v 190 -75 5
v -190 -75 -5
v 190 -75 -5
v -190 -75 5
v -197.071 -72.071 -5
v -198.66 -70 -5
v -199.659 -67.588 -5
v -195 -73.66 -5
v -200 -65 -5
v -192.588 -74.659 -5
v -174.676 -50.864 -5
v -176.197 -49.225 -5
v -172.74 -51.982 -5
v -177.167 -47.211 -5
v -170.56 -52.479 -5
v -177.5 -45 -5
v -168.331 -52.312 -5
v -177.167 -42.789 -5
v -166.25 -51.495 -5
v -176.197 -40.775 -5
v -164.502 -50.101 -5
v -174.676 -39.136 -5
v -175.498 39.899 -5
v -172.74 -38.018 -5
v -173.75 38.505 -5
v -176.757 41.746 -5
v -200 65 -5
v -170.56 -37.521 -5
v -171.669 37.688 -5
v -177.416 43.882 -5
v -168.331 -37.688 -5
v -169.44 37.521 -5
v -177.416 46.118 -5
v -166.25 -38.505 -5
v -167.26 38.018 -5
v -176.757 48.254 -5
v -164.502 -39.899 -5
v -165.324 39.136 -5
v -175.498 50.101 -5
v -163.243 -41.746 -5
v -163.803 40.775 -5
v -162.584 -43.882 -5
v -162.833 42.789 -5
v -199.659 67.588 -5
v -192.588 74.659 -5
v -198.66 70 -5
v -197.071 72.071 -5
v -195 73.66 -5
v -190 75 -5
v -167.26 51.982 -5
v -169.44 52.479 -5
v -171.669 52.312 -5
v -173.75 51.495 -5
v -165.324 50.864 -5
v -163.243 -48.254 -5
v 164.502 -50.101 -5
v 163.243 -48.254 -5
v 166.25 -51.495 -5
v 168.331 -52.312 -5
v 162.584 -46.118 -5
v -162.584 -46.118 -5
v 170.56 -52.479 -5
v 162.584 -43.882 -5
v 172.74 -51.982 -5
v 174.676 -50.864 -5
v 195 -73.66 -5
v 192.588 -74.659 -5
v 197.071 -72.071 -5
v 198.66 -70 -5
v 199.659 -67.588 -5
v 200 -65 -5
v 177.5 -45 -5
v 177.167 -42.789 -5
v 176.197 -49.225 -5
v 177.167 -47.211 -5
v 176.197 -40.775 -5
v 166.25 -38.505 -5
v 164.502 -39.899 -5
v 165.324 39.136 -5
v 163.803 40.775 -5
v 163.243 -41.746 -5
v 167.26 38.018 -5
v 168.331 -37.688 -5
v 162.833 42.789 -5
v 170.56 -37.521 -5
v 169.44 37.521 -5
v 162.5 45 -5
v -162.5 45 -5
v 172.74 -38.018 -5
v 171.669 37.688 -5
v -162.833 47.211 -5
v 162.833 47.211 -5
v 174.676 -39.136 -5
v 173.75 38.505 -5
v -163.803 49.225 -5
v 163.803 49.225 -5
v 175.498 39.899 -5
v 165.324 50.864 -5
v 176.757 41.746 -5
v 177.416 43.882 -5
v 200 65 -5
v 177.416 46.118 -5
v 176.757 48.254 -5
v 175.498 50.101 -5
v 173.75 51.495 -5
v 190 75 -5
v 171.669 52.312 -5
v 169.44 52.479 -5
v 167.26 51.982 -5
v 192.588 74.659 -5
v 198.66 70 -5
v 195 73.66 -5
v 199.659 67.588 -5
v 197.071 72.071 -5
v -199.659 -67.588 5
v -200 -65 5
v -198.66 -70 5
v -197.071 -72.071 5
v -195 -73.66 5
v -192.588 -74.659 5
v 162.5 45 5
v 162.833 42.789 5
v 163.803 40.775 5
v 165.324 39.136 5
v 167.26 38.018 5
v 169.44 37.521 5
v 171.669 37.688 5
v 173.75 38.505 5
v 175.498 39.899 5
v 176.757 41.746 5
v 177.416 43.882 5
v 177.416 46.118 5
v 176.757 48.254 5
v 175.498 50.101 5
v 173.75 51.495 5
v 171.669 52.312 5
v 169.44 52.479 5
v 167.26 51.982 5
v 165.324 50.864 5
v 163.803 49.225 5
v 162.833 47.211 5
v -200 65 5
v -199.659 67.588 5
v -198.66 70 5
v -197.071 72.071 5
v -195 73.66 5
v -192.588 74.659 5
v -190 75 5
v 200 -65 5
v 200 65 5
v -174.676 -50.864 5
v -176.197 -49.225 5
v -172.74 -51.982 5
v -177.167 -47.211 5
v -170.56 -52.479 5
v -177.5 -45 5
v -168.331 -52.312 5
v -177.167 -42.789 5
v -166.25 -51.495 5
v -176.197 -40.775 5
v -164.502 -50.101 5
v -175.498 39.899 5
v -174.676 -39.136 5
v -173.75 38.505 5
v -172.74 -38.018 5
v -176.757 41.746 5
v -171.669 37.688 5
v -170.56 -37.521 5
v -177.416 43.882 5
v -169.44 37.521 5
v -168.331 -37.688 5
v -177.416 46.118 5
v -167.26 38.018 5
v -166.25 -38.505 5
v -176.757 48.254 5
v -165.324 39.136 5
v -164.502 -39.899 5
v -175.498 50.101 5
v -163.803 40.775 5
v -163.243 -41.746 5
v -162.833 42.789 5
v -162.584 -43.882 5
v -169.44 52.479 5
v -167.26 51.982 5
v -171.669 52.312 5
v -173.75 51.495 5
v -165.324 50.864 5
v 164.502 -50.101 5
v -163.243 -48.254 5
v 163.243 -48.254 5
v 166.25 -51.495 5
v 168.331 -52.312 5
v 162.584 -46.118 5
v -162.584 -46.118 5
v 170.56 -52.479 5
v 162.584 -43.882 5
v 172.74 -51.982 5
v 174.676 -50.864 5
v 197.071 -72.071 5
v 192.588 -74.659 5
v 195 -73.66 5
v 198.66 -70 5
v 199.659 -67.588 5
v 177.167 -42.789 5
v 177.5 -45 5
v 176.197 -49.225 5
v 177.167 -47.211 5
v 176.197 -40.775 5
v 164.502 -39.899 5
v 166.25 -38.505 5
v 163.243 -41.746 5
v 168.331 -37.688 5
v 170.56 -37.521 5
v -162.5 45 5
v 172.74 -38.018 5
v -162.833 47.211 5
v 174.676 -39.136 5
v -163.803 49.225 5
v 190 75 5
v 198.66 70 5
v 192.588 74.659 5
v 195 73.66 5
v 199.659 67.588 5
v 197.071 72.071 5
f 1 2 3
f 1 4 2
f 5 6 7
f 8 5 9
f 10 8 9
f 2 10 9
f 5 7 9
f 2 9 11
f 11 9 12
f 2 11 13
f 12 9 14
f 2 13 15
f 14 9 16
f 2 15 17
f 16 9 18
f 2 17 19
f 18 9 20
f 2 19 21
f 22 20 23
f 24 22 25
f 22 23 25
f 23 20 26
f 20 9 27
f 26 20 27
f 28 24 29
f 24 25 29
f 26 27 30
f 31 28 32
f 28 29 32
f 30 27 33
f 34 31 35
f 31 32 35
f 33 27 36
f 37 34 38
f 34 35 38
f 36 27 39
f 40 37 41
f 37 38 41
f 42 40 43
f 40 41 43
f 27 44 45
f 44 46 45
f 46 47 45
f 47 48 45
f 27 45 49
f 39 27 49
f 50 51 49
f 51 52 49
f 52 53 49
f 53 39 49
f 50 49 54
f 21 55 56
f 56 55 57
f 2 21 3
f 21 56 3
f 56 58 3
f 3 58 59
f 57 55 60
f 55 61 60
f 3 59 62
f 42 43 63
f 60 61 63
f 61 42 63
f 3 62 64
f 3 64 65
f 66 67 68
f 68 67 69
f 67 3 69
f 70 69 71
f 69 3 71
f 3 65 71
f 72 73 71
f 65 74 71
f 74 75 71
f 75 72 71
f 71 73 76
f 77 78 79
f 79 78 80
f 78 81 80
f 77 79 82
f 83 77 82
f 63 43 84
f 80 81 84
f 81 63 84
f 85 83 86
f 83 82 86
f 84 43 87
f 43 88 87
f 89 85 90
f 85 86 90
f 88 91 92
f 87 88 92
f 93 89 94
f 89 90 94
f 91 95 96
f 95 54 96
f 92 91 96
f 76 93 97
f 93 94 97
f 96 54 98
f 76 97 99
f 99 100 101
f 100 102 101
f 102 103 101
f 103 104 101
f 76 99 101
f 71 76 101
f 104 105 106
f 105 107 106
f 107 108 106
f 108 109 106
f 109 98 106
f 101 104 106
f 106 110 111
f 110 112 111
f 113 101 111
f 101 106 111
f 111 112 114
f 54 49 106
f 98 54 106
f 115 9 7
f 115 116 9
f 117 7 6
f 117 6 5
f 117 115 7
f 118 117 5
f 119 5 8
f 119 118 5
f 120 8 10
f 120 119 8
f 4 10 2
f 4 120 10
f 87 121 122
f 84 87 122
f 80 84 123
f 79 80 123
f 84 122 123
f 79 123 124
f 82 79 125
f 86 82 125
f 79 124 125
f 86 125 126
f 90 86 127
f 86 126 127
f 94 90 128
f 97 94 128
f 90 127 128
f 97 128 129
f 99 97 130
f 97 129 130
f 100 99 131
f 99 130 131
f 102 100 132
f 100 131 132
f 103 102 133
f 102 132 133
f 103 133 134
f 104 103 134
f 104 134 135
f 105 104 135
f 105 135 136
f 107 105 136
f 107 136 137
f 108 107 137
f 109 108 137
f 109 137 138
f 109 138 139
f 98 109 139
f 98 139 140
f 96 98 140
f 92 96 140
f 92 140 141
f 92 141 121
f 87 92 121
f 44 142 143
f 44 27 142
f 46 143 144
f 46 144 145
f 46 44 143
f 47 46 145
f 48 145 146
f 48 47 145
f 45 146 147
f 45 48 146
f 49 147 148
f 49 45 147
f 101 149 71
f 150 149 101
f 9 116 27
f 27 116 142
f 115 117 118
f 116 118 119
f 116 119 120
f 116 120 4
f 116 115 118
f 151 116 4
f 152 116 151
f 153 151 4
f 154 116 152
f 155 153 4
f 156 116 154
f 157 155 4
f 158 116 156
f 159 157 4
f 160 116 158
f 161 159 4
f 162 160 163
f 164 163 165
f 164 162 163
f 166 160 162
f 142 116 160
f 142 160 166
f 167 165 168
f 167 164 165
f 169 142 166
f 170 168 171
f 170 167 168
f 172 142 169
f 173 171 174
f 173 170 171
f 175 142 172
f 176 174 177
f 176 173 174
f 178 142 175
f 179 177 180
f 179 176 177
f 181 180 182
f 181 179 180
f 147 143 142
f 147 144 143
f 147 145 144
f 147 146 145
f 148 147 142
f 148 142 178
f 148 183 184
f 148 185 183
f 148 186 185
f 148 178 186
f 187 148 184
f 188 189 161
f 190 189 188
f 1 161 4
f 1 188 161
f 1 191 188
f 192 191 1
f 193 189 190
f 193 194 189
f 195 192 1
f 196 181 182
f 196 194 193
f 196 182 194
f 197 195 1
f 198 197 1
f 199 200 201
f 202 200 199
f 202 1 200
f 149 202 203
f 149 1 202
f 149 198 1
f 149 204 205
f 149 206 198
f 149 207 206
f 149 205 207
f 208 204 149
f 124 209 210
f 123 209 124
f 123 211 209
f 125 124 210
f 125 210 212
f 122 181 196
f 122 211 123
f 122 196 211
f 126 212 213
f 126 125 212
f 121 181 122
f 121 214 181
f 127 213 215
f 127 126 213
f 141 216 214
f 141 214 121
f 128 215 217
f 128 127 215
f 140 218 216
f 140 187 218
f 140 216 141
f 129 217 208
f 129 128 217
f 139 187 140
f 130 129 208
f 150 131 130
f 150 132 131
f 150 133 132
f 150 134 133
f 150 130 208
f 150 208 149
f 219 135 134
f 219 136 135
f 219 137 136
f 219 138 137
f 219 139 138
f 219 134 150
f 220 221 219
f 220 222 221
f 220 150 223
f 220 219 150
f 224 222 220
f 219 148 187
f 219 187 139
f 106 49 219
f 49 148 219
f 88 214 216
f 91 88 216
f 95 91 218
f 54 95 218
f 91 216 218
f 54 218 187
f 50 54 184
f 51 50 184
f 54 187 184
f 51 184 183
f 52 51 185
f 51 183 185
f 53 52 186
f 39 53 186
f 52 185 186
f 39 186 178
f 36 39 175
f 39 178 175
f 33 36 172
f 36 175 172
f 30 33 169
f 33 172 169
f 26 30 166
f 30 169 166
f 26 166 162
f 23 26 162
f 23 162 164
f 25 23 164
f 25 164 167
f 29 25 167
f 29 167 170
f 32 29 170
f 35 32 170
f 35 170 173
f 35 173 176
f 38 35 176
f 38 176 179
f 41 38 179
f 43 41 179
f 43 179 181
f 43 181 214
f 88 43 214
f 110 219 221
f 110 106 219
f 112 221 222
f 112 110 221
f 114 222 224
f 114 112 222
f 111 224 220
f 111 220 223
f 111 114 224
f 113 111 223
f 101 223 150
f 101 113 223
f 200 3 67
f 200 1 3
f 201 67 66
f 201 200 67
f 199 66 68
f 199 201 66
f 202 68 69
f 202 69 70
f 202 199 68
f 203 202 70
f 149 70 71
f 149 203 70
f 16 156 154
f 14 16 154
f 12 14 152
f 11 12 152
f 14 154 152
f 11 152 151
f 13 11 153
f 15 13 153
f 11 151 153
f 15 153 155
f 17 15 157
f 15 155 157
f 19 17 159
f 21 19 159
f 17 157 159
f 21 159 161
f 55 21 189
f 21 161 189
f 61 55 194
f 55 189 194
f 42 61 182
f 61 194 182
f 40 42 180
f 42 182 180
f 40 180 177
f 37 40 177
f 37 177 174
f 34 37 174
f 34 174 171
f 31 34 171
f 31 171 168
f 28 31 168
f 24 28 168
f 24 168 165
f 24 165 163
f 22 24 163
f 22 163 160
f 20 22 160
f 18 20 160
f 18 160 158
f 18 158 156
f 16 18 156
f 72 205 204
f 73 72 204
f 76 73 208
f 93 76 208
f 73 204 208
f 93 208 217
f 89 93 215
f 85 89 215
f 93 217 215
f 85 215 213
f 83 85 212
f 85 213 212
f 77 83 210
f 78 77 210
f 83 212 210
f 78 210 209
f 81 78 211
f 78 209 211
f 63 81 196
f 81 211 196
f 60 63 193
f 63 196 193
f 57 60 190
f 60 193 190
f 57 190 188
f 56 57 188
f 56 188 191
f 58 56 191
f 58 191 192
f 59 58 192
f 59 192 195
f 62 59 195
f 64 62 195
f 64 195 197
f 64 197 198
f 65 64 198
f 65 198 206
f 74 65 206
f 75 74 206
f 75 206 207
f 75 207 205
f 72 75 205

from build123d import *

# Parameters (mm, degrees)
SKETCH_1_W          = 400
SKETCH_1_H          = 150
EXTRUDE_1_DEPTH     = 5
SKETCH_2_R          = 7.5
CUT_EXTRUDE_1_DEPTH = 214.834047803
FILLET_1_R          = 10


with BuildPart() as part:
    # Эскиз1 → Бобышка-Вытянуть1 (new, symmetric)
    with BuildSketch(Plane.XY):
        Rectangle(SKETCH_1_W, SKETCH_1_H)
    extrude(amount=EXTRUDE_1_DEPTH, both=True)

    # Эскиз2 → Вырез-Вытянуть1 (cut, through all)
    with BuildSketch(Plane.XY.offset(5)):
        with Locations((-170, 45)):
            Circle(SKETCH_2_R)
        with Locations(Location((-170, -45, 0), (0, 0, 180))):
            Circle(SKETCH_2_R)
        with Locations((170, -45)):
            Circle(SKETCH_2_R)
        with Locations(Location((170, 45, 0), (0, 0, 180))):
            Circle(SKETCH_2_R)
    extrude(amount=-CUT_EXTRUDE_1_DEPTH, mode=Mode.SUBTRACT)

    # Скругление1
    fillet_1_edges = [part.edges().sort_by_distance(p)[0] for p in [
        (200, -75, 0),
        (-200, -75, 0),
        (-200, 75, 0),
        (200, 75, 0),
    ]]
    fillet(fillet_1_edges, radius=FILLET_1_R)


solid = part.part
